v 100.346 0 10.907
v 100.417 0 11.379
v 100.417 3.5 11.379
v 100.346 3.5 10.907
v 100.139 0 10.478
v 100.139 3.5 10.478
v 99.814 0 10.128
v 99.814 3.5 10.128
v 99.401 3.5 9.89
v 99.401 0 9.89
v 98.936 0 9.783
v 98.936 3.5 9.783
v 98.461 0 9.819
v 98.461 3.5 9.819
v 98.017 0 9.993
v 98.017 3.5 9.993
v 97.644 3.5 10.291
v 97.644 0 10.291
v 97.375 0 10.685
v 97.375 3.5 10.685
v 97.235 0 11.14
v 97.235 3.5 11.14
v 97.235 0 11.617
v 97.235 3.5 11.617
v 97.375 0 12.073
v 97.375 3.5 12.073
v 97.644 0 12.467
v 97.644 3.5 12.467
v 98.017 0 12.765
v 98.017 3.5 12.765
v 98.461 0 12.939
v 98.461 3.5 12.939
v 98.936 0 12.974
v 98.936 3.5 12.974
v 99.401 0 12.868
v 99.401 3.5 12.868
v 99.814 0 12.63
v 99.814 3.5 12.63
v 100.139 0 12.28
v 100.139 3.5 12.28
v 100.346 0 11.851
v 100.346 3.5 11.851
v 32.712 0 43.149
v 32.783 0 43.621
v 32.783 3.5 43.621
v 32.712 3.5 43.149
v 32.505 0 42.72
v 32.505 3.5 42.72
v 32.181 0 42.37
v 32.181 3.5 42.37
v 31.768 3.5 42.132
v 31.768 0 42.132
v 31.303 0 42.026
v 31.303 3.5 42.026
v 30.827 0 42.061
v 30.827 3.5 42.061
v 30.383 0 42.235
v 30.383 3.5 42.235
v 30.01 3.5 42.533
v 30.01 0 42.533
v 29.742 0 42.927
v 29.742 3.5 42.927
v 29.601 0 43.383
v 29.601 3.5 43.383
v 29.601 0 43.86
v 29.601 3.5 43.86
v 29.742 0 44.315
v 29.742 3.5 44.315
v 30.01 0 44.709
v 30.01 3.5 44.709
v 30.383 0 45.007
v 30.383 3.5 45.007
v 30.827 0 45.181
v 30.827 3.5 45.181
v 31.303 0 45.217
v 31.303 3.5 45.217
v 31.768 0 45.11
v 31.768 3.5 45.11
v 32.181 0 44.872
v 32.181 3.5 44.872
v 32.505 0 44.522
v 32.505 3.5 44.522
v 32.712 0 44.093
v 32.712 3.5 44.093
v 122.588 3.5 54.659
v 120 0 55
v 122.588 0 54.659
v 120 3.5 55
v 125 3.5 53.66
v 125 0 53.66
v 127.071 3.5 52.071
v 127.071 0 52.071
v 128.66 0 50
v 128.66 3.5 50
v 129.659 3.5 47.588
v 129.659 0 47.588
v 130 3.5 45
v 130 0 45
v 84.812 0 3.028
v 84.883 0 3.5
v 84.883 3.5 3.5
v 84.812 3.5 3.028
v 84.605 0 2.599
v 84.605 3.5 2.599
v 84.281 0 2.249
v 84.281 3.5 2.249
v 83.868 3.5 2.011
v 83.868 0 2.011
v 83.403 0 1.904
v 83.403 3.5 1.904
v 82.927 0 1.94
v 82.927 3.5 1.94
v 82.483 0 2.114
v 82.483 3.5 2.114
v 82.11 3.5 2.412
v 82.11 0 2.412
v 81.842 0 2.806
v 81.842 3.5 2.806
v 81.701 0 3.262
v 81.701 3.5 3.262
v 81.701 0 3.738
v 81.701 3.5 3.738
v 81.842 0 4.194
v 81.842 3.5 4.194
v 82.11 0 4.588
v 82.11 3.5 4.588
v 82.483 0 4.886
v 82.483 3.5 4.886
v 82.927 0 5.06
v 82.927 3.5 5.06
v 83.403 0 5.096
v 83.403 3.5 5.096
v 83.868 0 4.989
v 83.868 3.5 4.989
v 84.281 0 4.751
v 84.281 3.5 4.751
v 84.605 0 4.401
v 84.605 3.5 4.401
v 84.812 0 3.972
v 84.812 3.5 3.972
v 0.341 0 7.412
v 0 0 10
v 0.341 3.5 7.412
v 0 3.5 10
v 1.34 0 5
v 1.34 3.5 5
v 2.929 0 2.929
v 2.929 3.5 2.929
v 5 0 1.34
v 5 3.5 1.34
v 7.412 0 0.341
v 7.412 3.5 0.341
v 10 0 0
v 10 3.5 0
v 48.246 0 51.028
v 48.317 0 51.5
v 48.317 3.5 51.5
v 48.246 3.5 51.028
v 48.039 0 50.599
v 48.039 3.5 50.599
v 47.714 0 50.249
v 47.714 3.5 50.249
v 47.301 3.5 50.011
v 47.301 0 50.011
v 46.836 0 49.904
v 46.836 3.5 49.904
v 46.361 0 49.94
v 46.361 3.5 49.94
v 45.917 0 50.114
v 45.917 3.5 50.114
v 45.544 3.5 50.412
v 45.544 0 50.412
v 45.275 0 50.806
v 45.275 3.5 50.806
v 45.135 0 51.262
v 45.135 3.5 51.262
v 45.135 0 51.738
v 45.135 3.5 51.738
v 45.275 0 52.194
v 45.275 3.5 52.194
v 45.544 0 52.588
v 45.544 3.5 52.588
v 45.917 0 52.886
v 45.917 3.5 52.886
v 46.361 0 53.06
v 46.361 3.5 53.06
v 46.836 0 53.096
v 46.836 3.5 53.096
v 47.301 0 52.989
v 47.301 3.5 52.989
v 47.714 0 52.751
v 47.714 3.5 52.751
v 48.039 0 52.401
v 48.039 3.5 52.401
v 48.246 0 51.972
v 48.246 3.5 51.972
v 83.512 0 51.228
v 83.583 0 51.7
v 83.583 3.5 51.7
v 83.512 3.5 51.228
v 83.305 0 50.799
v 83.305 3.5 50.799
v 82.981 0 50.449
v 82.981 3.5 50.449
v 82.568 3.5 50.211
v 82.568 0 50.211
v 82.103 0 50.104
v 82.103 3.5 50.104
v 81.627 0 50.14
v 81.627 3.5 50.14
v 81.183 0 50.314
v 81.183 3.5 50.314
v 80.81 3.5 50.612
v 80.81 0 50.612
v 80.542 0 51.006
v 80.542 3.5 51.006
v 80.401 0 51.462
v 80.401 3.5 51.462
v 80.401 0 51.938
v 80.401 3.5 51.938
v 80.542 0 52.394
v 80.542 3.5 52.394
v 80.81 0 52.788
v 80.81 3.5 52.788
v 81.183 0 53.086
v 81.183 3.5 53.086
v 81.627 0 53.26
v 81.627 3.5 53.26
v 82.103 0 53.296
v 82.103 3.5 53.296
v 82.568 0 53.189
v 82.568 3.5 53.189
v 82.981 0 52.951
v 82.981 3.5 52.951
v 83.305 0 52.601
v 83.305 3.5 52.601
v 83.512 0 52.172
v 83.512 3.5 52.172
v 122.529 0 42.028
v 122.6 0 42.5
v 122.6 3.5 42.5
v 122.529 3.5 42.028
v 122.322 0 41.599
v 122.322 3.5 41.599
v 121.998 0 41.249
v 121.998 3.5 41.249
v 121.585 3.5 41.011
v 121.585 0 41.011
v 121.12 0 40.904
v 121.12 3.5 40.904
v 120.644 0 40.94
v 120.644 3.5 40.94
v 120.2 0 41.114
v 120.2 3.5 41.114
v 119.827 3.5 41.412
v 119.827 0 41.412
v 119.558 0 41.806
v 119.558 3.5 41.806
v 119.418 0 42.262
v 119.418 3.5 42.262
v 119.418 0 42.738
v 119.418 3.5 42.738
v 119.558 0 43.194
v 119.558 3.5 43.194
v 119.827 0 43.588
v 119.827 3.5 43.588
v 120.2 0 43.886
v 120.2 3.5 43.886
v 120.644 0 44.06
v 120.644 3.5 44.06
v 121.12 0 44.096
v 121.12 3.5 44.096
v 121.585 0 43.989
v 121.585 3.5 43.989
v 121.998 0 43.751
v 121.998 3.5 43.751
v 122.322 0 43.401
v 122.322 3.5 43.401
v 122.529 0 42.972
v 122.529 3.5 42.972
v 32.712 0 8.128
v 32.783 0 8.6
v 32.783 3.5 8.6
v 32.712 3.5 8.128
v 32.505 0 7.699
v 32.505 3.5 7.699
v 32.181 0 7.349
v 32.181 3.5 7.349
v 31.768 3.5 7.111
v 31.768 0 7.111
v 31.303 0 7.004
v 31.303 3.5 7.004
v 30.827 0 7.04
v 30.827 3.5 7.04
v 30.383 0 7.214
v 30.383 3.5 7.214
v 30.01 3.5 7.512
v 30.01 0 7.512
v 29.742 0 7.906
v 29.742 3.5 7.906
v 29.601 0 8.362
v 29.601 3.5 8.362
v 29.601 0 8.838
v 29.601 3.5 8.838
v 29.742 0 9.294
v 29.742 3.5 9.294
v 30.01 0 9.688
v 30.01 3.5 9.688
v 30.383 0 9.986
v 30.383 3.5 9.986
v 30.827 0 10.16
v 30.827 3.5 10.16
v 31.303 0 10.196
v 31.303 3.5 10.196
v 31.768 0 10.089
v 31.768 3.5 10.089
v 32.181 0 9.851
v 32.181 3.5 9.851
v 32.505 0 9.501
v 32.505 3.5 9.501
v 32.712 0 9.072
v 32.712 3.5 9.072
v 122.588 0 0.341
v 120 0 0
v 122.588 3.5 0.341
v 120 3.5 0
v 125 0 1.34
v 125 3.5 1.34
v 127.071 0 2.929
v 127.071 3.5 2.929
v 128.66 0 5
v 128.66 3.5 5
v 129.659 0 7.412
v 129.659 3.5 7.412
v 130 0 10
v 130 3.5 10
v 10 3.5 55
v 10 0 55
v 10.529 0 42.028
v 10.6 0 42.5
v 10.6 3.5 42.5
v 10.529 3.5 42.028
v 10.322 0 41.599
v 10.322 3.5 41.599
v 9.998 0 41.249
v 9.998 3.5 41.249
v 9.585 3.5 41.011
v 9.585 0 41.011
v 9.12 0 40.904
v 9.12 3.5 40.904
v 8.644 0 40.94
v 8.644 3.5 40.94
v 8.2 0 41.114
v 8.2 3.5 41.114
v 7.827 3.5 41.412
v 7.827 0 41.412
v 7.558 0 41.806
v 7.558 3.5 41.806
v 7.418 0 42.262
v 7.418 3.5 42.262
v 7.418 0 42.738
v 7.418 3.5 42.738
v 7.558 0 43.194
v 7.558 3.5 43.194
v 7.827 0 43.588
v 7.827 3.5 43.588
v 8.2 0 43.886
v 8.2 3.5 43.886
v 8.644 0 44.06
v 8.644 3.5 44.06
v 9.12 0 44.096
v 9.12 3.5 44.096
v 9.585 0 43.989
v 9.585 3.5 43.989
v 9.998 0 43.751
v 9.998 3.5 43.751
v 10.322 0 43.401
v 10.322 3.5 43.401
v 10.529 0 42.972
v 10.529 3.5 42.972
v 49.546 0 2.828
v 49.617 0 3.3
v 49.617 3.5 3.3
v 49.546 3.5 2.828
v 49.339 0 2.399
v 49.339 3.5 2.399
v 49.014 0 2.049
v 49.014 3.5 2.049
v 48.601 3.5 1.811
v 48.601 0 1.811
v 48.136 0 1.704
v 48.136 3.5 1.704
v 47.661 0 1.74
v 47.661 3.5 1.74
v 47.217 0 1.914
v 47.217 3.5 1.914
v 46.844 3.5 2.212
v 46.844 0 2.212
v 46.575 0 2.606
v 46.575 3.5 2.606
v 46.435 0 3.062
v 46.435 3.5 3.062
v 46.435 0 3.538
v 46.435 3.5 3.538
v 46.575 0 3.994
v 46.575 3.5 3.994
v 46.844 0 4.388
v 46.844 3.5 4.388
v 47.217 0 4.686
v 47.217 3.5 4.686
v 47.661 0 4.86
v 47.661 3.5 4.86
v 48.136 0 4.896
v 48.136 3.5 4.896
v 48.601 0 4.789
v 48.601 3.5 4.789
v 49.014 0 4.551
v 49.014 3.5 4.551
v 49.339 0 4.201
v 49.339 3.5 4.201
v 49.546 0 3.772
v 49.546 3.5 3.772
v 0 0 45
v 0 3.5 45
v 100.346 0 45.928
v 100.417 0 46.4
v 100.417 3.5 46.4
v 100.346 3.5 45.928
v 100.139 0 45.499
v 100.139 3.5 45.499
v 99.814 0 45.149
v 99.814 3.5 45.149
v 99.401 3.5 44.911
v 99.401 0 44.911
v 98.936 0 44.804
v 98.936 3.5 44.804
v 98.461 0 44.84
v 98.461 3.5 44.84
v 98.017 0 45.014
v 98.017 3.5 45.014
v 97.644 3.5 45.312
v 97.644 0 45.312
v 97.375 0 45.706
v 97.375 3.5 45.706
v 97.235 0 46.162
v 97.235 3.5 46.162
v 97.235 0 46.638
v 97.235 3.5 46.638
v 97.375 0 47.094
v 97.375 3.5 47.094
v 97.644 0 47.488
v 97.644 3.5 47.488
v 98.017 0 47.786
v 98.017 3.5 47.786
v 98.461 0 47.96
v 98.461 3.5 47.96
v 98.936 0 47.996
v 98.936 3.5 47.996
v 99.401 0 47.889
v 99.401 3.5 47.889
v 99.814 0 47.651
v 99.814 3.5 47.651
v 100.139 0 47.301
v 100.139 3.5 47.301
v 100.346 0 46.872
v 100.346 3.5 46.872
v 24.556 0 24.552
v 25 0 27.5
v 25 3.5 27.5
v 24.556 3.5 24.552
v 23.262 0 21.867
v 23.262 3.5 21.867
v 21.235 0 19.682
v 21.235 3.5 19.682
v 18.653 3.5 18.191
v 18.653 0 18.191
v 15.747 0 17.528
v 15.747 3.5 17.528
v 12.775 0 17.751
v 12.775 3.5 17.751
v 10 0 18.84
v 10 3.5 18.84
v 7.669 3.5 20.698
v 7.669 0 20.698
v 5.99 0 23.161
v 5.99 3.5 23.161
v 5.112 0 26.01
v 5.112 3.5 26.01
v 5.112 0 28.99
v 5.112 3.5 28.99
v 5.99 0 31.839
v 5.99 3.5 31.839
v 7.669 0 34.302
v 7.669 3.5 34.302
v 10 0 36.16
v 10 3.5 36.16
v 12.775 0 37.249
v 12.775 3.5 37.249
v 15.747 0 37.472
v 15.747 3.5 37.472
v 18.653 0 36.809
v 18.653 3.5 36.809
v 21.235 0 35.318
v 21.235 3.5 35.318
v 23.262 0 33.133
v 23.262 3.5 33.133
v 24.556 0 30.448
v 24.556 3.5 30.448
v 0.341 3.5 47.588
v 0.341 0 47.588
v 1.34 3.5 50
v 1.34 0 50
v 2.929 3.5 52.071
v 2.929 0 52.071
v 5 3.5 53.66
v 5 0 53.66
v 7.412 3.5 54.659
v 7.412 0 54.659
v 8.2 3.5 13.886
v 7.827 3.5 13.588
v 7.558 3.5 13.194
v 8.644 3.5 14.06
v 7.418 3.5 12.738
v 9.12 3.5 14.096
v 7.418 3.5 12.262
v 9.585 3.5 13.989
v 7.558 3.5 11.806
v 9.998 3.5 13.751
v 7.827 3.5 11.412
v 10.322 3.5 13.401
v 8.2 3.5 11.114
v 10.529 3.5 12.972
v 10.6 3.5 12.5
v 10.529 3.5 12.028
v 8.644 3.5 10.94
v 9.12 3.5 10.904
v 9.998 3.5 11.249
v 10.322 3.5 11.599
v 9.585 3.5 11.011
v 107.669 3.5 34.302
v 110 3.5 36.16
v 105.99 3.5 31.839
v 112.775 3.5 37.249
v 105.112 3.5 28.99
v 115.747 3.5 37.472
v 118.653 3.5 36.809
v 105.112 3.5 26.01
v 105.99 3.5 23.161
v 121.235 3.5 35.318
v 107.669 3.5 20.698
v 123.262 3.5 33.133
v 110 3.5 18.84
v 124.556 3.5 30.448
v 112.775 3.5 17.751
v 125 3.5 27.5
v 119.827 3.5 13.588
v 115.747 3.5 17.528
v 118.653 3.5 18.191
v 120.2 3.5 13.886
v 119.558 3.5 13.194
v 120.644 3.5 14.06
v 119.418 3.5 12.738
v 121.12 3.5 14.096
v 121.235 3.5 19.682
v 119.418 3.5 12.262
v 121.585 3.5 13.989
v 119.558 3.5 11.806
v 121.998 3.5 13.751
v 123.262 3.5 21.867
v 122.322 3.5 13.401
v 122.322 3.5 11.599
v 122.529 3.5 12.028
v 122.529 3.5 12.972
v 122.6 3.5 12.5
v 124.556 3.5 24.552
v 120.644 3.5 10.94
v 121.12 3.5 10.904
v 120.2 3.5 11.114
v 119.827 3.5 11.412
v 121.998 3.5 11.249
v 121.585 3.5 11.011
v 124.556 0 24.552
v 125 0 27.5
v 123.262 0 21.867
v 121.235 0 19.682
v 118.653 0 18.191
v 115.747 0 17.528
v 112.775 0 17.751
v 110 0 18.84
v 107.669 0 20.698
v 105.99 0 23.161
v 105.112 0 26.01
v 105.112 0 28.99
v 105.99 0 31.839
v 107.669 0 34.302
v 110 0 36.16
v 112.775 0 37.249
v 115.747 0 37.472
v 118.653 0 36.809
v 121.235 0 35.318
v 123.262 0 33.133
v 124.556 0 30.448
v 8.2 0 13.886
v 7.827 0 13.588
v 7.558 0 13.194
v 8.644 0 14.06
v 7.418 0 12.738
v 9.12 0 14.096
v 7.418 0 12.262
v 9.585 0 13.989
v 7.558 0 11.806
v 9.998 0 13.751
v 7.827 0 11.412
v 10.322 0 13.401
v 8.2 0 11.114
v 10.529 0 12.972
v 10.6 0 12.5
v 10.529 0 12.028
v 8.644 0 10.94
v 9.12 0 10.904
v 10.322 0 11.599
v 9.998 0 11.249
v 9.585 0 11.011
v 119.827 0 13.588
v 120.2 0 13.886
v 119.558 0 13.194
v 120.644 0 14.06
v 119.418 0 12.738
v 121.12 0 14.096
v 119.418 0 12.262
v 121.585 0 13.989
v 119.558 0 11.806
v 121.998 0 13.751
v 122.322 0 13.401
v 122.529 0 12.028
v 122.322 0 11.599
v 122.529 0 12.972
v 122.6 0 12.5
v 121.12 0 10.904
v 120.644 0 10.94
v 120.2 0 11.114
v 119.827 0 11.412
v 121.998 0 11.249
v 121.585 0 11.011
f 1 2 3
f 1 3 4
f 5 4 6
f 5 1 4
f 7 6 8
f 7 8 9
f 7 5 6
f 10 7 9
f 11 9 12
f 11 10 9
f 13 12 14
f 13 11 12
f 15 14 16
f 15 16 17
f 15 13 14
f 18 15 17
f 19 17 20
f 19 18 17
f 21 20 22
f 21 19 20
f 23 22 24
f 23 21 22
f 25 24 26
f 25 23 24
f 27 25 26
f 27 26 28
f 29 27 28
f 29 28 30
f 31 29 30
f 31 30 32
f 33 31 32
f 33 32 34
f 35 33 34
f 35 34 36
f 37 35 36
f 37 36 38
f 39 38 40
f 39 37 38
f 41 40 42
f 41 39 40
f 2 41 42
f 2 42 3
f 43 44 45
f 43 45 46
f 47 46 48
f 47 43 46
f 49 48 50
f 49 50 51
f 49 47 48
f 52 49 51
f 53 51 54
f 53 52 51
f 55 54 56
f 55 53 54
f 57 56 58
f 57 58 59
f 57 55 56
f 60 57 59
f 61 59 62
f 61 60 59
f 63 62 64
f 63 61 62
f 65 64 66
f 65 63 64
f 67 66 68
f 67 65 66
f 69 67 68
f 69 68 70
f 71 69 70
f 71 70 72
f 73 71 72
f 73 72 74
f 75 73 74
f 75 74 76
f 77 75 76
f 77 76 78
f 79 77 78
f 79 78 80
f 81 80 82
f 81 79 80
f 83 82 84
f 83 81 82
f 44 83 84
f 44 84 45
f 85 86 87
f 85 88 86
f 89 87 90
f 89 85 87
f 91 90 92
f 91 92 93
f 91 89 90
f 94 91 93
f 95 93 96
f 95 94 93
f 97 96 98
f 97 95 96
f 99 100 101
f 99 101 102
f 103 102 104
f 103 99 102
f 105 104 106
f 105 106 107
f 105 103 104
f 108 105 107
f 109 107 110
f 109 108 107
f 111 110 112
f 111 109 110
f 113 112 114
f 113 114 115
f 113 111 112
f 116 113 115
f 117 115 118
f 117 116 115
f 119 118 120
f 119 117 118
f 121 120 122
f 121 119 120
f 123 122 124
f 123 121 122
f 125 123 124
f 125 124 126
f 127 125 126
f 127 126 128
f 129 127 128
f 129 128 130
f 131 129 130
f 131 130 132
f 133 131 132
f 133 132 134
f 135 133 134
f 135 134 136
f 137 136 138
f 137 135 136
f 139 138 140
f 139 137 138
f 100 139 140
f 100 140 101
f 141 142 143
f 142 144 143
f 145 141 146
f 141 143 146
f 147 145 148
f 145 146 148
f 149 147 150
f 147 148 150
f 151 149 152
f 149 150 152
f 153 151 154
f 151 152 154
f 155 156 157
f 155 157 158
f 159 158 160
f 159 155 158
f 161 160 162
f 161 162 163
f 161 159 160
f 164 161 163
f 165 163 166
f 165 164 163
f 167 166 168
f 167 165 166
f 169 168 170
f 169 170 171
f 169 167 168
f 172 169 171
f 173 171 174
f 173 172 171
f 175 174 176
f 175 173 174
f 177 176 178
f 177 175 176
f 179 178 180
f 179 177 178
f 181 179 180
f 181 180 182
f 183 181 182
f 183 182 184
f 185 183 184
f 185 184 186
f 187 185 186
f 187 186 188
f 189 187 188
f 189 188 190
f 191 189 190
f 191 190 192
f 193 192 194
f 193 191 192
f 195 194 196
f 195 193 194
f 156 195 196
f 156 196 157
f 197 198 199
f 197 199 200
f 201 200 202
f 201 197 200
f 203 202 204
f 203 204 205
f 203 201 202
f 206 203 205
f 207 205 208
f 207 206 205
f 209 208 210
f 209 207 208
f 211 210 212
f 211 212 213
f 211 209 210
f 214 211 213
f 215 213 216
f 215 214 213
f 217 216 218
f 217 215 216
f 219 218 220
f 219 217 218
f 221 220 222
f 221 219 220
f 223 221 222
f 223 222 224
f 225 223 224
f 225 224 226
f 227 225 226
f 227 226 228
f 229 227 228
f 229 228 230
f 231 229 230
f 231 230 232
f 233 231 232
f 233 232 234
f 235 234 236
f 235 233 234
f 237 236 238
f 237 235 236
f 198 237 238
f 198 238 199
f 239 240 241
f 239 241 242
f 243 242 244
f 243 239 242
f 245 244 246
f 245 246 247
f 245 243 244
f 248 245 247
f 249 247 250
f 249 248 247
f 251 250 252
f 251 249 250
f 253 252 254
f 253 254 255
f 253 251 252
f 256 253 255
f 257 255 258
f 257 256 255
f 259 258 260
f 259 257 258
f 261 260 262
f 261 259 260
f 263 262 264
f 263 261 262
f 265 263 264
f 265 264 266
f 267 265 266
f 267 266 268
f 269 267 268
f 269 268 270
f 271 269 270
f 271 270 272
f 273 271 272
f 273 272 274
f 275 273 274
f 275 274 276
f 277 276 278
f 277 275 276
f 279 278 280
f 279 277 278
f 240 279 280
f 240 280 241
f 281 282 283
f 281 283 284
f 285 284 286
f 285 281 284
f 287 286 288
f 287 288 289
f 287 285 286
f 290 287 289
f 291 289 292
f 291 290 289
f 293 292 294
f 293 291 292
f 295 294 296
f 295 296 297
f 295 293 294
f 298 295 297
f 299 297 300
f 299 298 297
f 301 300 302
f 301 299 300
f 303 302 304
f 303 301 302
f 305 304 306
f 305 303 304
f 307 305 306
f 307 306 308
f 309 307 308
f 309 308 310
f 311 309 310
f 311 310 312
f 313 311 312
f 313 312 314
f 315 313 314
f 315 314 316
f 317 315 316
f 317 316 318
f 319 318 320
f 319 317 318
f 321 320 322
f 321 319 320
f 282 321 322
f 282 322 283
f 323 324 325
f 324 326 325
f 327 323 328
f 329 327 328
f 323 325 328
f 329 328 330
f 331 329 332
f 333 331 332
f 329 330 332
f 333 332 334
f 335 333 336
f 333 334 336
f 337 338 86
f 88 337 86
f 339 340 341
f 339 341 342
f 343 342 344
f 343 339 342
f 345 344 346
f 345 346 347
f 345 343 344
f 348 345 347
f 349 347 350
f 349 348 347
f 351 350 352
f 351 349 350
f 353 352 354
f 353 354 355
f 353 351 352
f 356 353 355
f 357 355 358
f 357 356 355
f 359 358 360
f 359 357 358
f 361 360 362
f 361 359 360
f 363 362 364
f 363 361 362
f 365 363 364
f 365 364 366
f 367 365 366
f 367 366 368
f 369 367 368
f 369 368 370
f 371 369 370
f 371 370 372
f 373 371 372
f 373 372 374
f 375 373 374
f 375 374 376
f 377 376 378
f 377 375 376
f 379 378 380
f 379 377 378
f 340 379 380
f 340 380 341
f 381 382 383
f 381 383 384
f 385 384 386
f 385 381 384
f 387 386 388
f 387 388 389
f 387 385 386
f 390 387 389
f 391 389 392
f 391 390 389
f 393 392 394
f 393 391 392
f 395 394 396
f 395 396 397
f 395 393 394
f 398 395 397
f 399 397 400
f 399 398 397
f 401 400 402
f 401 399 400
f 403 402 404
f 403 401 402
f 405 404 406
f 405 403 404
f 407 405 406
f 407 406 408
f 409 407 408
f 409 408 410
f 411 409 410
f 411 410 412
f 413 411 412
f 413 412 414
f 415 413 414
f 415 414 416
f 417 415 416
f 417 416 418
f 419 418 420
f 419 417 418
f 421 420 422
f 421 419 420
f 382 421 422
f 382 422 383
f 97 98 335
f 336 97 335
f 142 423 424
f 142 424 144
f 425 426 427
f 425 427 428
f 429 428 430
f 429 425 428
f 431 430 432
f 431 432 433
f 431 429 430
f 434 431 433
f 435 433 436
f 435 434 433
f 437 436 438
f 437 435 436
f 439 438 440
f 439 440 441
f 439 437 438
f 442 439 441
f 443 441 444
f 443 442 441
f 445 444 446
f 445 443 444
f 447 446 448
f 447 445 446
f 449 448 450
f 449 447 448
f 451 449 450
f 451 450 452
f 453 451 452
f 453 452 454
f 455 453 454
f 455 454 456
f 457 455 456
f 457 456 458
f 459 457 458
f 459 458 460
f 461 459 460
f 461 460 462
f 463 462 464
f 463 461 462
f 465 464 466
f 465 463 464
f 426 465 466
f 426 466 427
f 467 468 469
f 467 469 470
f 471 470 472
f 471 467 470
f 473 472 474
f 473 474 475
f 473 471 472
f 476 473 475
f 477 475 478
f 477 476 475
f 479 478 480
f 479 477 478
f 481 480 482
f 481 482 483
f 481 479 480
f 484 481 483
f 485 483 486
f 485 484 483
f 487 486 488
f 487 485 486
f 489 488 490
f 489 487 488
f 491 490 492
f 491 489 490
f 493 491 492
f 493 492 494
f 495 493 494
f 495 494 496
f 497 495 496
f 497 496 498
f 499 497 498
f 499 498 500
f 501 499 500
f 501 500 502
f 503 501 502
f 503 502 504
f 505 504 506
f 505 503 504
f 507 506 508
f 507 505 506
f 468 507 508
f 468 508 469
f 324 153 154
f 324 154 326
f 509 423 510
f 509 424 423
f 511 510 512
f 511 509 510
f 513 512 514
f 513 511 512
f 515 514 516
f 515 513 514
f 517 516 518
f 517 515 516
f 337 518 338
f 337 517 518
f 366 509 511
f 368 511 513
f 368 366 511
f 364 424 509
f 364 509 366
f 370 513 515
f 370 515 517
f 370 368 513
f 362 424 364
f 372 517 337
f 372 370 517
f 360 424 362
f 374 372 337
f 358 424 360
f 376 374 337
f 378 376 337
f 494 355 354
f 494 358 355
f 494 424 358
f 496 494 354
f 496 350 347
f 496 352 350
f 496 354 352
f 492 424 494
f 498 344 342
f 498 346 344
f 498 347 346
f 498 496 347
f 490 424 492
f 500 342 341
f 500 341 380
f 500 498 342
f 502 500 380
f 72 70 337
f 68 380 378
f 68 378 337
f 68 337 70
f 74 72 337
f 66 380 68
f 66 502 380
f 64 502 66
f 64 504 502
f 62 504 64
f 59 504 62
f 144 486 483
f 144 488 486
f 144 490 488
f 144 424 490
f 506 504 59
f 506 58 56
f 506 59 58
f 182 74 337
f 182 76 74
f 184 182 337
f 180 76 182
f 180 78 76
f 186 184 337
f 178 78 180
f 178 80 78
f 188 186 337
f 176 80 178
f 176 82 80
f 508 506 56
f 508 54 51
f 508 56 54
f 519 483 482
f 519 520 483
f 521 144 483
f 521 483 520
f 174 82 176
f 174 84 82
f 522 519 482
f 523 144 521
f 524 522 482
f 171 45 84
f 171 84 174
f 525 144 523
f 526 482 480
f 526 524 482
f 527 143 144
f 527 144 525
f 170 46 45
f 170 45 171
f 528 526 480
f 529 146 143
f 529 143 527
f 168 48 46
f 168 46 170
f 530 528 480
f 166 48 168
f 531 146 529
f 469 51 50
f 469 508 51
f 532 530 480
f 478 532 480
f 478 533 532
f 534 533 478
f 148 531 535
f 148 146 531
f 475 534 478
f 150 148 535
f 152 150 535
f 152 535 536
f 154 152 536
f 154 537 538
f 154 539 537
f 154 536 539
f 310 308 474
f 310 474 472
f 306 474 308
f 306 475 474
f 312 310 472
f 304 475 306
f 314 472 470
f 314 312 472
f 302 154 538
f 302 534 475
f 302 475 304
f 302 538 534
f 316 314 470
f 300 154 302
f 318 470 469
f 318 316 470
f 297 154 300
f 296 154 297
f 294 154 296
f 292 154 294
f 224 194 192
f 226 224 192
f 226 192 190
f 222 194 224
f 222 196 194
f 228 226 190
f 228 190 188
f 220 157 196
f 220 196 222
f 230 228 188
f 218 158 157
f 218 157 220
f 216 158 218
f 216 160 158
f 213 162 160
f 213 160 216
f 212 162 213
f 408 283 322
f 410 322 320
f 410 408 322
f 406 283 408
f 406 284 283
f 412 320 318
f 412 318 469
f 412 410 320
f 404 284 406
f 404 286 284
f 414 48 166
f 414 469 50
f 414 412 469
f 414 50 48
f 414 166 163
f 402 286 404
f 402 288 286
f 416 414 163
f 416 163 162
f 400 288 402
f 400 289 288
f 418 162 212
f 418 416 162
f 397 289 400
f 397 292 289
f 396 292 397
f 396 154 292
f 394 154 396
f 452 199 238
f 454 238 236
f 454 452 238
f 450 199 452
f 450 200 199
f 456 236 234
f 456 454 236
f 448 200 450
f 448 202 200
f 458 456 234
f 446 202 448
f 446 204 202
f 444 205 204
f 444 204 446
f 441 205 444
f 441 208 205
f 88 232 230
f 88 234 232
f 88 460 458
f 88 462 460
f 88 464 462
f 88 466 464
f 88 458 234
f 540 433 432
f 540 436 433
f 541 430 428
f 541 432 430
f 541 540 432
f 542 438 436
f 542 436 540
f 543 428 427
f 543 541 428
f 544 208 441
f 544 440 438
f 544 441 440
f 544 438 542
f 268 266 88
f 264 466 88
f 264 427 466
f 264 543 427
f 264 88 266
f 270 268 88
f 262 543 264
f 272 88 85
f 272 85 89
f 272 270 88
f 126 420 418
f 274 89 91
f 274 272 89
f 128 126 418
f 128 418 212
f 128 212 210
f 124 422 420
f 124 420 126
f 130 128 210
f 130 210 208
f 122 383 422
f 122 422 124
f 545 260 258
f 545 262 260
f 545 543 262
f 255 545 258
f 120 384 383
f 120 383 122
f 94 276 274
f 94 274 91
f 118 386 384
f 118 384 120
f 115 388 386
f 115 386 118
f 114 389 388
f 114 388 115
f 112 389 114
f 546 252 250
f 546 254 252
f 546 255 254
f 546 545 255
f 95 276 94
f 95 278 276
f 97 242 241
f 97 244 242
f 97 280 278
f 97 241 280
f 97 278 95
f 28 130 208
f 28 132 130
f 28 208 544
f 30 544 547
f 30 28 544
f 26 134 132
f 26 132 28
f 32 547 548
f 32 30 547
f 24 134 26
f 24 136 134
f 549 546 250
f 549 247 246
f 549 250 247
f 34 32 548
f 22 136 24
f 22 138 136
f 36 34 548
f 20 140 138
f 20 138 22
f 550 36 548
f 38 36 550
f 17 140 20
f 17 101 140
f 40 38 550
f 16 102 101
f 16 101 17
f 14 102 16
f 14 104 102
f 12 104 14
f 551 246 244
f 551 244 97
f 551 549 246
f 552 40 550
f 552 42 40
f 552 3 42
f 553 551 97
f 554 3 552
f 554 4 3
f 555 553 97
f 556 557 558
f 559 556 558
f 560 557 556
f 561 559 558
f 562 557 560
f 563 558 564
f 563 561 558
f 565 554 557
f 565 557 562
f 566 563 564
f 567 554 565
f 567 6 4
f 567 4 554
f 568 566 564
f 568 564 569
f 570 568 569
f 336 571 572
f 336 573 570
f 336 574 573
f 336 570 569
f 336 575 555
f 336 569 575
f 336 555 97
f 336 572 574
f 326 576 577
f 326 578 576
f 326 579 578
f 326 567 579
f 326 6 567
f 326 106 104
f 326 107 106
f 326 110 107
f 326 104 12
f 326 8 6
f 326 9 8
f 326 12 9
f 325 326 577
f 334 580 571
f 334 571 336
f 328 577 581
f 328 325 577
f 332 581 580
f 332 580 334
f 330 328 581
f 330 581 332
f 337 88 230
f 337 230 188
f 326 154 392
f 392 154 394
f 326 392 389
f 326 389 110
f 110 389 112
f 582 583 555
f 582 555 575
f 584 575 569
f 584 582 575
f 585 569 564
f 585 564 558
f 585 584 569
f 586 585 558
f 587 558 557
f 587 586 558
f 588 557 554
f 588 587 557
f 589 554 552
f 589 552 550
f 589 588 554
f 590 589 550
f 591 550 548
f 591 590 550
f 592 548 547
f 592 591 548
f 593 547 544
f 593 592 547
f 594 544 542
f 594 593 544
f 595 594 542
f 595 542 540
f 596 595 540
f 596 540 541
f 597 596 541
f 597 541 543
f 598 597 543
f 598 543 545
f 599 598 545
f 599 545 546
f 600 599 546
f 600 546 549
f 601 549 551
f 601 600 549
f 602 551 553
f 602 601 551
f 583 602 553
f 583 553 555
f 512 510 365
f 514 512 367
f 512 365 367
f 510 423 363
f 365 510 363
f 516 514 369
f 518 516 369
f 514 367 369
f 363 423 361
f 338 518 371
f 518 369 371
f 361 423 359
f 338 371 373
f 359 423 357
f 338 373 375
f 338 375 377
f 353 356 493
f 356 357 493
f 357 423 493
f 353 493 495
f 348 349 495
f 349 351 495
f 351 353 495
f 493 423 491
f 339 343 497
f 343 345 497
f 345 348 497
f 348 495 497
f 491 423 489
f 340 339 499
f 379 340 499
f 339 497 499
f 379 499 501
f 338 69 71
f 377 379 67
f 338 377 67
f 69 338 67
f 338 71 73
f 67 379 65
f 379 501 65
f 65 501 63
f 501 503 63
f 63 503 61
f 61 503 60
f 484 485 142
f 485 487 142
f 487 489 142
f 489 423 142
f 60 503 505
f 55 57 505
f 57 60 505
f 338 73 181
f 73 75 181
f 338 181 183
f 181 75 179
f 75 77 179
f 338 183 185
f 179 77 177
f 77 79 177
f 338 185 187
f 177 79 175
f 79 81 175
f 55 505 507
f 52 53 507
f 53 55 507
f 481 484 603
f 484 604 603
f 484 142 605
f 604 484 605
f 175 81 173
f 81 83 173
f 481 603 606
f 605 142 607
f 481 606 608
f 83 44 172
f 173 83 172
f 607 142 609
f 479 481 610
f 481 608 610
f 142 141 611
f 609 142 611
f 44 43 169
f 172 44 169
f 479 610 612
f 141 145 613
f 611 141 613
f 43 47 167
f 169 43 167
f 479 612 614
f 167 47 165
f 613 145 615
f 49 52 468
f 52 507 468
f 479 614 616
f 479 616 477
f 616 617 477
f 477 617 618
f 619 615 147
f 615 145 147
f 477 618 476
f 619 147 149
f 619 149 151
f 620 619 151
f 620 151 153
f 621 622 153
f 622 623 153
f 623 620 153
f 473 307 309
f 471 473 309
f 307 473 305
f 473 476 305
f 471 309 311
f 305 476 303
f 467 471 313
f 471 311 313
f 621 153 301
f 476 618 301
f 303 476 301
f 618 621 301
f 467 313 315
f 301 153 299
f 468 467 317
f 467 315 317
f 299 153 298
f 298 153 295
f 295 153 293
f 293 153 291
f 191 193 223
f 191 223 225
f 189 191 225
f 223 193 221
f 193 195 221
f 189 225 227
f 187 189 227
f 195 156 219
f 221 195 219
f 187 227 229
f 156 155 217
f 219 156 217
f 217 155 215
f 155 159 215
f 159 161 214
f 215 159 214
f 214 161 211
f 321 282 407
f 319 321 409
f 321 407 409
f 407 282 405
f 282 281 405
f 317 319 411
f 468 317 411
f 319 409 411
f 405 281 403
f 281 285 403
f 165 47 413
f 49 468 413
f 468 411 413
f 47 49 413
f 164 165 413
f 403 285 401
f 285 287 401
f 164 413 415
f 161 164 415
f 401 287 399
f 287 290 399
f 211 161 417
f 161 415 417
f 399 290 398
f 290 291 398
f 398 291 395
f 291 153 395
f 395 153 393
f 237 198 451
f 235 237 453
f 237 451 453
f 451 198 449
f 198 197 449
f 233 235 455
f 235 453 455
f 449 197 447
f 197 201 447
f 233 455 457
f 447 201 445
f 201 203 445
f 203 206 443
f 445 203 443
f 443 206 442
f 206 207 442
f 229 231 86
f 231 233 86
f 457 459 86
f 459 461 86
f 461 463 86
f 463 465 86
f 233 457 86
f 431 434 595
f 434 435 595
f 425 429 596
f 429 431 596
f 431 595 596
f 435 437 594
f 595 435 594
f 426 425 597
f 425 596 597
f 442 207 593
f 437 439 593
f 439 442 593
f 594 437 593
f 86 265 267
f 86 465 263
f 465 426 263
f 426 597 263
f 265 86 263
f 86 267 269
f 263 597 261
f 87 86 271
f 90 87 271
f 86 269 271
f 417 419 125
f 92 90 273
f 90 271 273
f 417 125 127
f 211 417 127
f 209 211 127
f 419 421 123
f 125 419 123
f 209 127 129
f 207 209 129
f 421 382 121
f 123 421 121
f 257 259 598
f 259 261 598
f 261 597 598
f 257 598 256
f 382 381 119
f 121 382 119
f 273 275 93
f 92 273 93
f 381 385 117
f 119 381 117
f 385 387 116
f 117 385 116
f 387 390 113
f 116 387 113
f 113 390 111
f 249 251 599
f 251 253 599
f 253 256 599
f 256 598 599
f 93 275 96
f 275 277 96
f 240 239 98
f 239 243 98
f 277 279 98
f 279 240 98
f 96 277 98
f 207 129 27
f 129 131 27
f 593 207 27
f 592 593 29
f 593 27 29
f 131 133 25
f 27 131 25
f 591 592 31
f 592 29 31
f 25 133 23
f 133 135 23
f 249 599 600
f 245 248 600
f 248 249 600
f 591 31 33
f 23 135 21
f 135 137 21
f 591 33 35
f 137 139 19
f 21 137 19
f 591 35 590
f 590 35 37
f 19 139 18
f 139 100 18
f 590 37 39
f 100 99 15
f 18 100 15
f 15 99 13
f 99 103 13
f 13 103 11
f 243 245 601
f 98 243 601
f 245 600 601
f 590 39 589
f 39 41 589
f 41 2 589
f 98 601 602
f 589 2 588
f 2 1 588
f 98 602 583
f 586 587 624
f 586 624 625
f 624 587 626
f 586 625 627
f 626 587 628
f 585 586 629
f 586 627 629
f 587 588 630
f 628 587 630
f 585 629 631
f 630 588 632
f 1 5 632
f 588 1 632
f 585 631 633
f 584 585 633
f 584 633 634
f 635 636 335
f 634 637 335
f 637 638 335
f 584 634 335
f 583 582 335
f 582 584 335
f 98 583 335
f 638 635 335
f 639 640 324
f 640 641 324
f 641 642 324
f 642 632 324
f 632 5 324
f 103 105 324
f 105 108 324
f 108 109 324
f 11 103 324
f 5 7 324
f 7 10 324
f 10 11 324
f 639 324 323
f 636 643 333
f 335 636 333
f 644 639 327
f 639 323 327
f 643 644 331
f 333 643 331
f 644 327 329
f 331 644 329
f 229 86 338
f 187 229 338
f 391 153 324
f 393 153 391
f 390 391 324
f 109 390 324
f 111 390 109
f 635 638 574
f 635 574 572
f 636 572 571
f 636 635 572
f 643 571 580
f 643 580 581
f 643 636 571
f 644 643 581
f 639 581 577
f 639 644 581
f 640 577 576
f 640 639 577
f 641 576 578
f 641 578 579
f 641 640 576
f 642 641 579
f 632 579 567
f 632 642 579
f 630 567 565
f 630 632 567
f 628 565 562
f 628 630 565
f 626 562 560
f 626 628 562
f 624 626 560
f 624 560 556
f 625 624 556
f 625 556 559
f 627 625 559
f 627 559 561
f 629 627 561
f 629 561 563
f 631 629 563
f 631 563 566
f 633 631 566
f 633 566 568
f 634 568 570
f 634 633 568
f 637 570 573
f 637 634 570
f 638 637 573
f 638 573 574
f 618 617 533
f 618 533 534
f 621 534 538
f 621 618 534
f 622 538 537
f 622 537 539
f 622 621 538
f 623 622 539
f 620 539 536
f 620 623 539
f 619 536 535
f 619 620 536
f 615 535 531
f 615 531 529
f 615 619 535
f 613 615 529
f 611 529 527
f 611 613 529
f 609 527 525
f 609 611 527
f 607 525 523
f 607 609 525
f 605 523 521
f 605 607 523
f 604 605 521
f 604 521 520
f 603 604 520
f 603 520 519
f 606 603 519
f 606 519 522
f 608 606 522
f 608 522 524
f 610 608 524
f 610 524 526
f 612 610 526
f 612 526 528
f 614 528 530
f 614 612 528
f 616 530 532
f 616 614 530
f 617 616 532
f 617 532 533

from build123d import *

# Parameters (mm, degrees)
SKETCH1_W           = 130
SKETCH1_H           = 55
SKETCH1_R           = 1.6
SKETCH1_R_2         = 10
BOSS_EXTRUDE3_DEPTH = 3.5
FILLET3_R           = 10


with BuildPart() as part:
    # Sketch1 → Boss-Extrude3 (new body)
    with BuildSketch(Plane(origin=(0, 0, 0), x_dir=(1, 0, 0), z_dir=(0, 1, 0))):
        with Locations((65, -27.5)):
            Rectangle(SKETCH1_W, SKETCH1_H)
        with Locations((9, -12.5)):
            Circle(SKETCH1_R, mode=Mode.SUBTRACT)
        with Locations((9, -42.5)):
            Circle(SKETCH1_R, mode=Mode.SUBTRACT)
        with Locations((121, -42.5)):
            Circle(SKETCH1_R, mode=Mode.SUBTRACT)
        with Locations((121, -12.5)):
            Circle(SKETCH1_R, mode=Mode.SUBTRACT)
        with Locations((15, -27.5)):
            Circle(SKETCH1_R_2, mode=Mode.SUBTRACT)
        with Locations((115, -27.5)):
            Circle(SKETCH1_R_2, mode=Mode.SUBTRACT)
        with Locations((48.016852514, -3.3)):
            Circle(SKETCH1_R, mode=Mode.SUBTRACT)
        with Locations((46.716852514, -51.5)):
            Circle(SKETCH1_R, mode=Mode.SUBTRACT)
        with Locations((98.816852514, -46.4)):
            Circle(SKETCH1_R, mode=Mode.SUBTRACT)
        with Locations((98.816852514, -11.378935708)):
            Circle(SKETCH1_R, mode=Mode.SUBTRACT)
        with Locations((31.183147486, -43.621064292)):
            Circle(SKETCH1_R, mode=Mode.SUBTRACT)
        with Locations((31.183147486, -8.6)):
            Circle(SKETCH1_R, mode=Mode.SUBTRACT)
        with Locations((83.283147486, -3.5)):
            Circle(SKETCH1_R, mode=Mode.SUBTRACT)
        with Locations((81.983147486, -51.7)):
            Circle(SKETCH1_R, mode=Mode.SUBTRACT)
    extrude(amount=BOSS_EXTRUDE3_DEPTH)

    # Fillet3
    fillet3_edges = [part.edges().sort_by_distance(p)[0] for p in [
        (0, 1.75, 0),
        (130, 1.75, 0),
        (130, 1.75, 55),
        (0, 1.75, 55),
    ]]
    fillet(fillet3_edges, radius=FILLET3_R)


solid = part.part
